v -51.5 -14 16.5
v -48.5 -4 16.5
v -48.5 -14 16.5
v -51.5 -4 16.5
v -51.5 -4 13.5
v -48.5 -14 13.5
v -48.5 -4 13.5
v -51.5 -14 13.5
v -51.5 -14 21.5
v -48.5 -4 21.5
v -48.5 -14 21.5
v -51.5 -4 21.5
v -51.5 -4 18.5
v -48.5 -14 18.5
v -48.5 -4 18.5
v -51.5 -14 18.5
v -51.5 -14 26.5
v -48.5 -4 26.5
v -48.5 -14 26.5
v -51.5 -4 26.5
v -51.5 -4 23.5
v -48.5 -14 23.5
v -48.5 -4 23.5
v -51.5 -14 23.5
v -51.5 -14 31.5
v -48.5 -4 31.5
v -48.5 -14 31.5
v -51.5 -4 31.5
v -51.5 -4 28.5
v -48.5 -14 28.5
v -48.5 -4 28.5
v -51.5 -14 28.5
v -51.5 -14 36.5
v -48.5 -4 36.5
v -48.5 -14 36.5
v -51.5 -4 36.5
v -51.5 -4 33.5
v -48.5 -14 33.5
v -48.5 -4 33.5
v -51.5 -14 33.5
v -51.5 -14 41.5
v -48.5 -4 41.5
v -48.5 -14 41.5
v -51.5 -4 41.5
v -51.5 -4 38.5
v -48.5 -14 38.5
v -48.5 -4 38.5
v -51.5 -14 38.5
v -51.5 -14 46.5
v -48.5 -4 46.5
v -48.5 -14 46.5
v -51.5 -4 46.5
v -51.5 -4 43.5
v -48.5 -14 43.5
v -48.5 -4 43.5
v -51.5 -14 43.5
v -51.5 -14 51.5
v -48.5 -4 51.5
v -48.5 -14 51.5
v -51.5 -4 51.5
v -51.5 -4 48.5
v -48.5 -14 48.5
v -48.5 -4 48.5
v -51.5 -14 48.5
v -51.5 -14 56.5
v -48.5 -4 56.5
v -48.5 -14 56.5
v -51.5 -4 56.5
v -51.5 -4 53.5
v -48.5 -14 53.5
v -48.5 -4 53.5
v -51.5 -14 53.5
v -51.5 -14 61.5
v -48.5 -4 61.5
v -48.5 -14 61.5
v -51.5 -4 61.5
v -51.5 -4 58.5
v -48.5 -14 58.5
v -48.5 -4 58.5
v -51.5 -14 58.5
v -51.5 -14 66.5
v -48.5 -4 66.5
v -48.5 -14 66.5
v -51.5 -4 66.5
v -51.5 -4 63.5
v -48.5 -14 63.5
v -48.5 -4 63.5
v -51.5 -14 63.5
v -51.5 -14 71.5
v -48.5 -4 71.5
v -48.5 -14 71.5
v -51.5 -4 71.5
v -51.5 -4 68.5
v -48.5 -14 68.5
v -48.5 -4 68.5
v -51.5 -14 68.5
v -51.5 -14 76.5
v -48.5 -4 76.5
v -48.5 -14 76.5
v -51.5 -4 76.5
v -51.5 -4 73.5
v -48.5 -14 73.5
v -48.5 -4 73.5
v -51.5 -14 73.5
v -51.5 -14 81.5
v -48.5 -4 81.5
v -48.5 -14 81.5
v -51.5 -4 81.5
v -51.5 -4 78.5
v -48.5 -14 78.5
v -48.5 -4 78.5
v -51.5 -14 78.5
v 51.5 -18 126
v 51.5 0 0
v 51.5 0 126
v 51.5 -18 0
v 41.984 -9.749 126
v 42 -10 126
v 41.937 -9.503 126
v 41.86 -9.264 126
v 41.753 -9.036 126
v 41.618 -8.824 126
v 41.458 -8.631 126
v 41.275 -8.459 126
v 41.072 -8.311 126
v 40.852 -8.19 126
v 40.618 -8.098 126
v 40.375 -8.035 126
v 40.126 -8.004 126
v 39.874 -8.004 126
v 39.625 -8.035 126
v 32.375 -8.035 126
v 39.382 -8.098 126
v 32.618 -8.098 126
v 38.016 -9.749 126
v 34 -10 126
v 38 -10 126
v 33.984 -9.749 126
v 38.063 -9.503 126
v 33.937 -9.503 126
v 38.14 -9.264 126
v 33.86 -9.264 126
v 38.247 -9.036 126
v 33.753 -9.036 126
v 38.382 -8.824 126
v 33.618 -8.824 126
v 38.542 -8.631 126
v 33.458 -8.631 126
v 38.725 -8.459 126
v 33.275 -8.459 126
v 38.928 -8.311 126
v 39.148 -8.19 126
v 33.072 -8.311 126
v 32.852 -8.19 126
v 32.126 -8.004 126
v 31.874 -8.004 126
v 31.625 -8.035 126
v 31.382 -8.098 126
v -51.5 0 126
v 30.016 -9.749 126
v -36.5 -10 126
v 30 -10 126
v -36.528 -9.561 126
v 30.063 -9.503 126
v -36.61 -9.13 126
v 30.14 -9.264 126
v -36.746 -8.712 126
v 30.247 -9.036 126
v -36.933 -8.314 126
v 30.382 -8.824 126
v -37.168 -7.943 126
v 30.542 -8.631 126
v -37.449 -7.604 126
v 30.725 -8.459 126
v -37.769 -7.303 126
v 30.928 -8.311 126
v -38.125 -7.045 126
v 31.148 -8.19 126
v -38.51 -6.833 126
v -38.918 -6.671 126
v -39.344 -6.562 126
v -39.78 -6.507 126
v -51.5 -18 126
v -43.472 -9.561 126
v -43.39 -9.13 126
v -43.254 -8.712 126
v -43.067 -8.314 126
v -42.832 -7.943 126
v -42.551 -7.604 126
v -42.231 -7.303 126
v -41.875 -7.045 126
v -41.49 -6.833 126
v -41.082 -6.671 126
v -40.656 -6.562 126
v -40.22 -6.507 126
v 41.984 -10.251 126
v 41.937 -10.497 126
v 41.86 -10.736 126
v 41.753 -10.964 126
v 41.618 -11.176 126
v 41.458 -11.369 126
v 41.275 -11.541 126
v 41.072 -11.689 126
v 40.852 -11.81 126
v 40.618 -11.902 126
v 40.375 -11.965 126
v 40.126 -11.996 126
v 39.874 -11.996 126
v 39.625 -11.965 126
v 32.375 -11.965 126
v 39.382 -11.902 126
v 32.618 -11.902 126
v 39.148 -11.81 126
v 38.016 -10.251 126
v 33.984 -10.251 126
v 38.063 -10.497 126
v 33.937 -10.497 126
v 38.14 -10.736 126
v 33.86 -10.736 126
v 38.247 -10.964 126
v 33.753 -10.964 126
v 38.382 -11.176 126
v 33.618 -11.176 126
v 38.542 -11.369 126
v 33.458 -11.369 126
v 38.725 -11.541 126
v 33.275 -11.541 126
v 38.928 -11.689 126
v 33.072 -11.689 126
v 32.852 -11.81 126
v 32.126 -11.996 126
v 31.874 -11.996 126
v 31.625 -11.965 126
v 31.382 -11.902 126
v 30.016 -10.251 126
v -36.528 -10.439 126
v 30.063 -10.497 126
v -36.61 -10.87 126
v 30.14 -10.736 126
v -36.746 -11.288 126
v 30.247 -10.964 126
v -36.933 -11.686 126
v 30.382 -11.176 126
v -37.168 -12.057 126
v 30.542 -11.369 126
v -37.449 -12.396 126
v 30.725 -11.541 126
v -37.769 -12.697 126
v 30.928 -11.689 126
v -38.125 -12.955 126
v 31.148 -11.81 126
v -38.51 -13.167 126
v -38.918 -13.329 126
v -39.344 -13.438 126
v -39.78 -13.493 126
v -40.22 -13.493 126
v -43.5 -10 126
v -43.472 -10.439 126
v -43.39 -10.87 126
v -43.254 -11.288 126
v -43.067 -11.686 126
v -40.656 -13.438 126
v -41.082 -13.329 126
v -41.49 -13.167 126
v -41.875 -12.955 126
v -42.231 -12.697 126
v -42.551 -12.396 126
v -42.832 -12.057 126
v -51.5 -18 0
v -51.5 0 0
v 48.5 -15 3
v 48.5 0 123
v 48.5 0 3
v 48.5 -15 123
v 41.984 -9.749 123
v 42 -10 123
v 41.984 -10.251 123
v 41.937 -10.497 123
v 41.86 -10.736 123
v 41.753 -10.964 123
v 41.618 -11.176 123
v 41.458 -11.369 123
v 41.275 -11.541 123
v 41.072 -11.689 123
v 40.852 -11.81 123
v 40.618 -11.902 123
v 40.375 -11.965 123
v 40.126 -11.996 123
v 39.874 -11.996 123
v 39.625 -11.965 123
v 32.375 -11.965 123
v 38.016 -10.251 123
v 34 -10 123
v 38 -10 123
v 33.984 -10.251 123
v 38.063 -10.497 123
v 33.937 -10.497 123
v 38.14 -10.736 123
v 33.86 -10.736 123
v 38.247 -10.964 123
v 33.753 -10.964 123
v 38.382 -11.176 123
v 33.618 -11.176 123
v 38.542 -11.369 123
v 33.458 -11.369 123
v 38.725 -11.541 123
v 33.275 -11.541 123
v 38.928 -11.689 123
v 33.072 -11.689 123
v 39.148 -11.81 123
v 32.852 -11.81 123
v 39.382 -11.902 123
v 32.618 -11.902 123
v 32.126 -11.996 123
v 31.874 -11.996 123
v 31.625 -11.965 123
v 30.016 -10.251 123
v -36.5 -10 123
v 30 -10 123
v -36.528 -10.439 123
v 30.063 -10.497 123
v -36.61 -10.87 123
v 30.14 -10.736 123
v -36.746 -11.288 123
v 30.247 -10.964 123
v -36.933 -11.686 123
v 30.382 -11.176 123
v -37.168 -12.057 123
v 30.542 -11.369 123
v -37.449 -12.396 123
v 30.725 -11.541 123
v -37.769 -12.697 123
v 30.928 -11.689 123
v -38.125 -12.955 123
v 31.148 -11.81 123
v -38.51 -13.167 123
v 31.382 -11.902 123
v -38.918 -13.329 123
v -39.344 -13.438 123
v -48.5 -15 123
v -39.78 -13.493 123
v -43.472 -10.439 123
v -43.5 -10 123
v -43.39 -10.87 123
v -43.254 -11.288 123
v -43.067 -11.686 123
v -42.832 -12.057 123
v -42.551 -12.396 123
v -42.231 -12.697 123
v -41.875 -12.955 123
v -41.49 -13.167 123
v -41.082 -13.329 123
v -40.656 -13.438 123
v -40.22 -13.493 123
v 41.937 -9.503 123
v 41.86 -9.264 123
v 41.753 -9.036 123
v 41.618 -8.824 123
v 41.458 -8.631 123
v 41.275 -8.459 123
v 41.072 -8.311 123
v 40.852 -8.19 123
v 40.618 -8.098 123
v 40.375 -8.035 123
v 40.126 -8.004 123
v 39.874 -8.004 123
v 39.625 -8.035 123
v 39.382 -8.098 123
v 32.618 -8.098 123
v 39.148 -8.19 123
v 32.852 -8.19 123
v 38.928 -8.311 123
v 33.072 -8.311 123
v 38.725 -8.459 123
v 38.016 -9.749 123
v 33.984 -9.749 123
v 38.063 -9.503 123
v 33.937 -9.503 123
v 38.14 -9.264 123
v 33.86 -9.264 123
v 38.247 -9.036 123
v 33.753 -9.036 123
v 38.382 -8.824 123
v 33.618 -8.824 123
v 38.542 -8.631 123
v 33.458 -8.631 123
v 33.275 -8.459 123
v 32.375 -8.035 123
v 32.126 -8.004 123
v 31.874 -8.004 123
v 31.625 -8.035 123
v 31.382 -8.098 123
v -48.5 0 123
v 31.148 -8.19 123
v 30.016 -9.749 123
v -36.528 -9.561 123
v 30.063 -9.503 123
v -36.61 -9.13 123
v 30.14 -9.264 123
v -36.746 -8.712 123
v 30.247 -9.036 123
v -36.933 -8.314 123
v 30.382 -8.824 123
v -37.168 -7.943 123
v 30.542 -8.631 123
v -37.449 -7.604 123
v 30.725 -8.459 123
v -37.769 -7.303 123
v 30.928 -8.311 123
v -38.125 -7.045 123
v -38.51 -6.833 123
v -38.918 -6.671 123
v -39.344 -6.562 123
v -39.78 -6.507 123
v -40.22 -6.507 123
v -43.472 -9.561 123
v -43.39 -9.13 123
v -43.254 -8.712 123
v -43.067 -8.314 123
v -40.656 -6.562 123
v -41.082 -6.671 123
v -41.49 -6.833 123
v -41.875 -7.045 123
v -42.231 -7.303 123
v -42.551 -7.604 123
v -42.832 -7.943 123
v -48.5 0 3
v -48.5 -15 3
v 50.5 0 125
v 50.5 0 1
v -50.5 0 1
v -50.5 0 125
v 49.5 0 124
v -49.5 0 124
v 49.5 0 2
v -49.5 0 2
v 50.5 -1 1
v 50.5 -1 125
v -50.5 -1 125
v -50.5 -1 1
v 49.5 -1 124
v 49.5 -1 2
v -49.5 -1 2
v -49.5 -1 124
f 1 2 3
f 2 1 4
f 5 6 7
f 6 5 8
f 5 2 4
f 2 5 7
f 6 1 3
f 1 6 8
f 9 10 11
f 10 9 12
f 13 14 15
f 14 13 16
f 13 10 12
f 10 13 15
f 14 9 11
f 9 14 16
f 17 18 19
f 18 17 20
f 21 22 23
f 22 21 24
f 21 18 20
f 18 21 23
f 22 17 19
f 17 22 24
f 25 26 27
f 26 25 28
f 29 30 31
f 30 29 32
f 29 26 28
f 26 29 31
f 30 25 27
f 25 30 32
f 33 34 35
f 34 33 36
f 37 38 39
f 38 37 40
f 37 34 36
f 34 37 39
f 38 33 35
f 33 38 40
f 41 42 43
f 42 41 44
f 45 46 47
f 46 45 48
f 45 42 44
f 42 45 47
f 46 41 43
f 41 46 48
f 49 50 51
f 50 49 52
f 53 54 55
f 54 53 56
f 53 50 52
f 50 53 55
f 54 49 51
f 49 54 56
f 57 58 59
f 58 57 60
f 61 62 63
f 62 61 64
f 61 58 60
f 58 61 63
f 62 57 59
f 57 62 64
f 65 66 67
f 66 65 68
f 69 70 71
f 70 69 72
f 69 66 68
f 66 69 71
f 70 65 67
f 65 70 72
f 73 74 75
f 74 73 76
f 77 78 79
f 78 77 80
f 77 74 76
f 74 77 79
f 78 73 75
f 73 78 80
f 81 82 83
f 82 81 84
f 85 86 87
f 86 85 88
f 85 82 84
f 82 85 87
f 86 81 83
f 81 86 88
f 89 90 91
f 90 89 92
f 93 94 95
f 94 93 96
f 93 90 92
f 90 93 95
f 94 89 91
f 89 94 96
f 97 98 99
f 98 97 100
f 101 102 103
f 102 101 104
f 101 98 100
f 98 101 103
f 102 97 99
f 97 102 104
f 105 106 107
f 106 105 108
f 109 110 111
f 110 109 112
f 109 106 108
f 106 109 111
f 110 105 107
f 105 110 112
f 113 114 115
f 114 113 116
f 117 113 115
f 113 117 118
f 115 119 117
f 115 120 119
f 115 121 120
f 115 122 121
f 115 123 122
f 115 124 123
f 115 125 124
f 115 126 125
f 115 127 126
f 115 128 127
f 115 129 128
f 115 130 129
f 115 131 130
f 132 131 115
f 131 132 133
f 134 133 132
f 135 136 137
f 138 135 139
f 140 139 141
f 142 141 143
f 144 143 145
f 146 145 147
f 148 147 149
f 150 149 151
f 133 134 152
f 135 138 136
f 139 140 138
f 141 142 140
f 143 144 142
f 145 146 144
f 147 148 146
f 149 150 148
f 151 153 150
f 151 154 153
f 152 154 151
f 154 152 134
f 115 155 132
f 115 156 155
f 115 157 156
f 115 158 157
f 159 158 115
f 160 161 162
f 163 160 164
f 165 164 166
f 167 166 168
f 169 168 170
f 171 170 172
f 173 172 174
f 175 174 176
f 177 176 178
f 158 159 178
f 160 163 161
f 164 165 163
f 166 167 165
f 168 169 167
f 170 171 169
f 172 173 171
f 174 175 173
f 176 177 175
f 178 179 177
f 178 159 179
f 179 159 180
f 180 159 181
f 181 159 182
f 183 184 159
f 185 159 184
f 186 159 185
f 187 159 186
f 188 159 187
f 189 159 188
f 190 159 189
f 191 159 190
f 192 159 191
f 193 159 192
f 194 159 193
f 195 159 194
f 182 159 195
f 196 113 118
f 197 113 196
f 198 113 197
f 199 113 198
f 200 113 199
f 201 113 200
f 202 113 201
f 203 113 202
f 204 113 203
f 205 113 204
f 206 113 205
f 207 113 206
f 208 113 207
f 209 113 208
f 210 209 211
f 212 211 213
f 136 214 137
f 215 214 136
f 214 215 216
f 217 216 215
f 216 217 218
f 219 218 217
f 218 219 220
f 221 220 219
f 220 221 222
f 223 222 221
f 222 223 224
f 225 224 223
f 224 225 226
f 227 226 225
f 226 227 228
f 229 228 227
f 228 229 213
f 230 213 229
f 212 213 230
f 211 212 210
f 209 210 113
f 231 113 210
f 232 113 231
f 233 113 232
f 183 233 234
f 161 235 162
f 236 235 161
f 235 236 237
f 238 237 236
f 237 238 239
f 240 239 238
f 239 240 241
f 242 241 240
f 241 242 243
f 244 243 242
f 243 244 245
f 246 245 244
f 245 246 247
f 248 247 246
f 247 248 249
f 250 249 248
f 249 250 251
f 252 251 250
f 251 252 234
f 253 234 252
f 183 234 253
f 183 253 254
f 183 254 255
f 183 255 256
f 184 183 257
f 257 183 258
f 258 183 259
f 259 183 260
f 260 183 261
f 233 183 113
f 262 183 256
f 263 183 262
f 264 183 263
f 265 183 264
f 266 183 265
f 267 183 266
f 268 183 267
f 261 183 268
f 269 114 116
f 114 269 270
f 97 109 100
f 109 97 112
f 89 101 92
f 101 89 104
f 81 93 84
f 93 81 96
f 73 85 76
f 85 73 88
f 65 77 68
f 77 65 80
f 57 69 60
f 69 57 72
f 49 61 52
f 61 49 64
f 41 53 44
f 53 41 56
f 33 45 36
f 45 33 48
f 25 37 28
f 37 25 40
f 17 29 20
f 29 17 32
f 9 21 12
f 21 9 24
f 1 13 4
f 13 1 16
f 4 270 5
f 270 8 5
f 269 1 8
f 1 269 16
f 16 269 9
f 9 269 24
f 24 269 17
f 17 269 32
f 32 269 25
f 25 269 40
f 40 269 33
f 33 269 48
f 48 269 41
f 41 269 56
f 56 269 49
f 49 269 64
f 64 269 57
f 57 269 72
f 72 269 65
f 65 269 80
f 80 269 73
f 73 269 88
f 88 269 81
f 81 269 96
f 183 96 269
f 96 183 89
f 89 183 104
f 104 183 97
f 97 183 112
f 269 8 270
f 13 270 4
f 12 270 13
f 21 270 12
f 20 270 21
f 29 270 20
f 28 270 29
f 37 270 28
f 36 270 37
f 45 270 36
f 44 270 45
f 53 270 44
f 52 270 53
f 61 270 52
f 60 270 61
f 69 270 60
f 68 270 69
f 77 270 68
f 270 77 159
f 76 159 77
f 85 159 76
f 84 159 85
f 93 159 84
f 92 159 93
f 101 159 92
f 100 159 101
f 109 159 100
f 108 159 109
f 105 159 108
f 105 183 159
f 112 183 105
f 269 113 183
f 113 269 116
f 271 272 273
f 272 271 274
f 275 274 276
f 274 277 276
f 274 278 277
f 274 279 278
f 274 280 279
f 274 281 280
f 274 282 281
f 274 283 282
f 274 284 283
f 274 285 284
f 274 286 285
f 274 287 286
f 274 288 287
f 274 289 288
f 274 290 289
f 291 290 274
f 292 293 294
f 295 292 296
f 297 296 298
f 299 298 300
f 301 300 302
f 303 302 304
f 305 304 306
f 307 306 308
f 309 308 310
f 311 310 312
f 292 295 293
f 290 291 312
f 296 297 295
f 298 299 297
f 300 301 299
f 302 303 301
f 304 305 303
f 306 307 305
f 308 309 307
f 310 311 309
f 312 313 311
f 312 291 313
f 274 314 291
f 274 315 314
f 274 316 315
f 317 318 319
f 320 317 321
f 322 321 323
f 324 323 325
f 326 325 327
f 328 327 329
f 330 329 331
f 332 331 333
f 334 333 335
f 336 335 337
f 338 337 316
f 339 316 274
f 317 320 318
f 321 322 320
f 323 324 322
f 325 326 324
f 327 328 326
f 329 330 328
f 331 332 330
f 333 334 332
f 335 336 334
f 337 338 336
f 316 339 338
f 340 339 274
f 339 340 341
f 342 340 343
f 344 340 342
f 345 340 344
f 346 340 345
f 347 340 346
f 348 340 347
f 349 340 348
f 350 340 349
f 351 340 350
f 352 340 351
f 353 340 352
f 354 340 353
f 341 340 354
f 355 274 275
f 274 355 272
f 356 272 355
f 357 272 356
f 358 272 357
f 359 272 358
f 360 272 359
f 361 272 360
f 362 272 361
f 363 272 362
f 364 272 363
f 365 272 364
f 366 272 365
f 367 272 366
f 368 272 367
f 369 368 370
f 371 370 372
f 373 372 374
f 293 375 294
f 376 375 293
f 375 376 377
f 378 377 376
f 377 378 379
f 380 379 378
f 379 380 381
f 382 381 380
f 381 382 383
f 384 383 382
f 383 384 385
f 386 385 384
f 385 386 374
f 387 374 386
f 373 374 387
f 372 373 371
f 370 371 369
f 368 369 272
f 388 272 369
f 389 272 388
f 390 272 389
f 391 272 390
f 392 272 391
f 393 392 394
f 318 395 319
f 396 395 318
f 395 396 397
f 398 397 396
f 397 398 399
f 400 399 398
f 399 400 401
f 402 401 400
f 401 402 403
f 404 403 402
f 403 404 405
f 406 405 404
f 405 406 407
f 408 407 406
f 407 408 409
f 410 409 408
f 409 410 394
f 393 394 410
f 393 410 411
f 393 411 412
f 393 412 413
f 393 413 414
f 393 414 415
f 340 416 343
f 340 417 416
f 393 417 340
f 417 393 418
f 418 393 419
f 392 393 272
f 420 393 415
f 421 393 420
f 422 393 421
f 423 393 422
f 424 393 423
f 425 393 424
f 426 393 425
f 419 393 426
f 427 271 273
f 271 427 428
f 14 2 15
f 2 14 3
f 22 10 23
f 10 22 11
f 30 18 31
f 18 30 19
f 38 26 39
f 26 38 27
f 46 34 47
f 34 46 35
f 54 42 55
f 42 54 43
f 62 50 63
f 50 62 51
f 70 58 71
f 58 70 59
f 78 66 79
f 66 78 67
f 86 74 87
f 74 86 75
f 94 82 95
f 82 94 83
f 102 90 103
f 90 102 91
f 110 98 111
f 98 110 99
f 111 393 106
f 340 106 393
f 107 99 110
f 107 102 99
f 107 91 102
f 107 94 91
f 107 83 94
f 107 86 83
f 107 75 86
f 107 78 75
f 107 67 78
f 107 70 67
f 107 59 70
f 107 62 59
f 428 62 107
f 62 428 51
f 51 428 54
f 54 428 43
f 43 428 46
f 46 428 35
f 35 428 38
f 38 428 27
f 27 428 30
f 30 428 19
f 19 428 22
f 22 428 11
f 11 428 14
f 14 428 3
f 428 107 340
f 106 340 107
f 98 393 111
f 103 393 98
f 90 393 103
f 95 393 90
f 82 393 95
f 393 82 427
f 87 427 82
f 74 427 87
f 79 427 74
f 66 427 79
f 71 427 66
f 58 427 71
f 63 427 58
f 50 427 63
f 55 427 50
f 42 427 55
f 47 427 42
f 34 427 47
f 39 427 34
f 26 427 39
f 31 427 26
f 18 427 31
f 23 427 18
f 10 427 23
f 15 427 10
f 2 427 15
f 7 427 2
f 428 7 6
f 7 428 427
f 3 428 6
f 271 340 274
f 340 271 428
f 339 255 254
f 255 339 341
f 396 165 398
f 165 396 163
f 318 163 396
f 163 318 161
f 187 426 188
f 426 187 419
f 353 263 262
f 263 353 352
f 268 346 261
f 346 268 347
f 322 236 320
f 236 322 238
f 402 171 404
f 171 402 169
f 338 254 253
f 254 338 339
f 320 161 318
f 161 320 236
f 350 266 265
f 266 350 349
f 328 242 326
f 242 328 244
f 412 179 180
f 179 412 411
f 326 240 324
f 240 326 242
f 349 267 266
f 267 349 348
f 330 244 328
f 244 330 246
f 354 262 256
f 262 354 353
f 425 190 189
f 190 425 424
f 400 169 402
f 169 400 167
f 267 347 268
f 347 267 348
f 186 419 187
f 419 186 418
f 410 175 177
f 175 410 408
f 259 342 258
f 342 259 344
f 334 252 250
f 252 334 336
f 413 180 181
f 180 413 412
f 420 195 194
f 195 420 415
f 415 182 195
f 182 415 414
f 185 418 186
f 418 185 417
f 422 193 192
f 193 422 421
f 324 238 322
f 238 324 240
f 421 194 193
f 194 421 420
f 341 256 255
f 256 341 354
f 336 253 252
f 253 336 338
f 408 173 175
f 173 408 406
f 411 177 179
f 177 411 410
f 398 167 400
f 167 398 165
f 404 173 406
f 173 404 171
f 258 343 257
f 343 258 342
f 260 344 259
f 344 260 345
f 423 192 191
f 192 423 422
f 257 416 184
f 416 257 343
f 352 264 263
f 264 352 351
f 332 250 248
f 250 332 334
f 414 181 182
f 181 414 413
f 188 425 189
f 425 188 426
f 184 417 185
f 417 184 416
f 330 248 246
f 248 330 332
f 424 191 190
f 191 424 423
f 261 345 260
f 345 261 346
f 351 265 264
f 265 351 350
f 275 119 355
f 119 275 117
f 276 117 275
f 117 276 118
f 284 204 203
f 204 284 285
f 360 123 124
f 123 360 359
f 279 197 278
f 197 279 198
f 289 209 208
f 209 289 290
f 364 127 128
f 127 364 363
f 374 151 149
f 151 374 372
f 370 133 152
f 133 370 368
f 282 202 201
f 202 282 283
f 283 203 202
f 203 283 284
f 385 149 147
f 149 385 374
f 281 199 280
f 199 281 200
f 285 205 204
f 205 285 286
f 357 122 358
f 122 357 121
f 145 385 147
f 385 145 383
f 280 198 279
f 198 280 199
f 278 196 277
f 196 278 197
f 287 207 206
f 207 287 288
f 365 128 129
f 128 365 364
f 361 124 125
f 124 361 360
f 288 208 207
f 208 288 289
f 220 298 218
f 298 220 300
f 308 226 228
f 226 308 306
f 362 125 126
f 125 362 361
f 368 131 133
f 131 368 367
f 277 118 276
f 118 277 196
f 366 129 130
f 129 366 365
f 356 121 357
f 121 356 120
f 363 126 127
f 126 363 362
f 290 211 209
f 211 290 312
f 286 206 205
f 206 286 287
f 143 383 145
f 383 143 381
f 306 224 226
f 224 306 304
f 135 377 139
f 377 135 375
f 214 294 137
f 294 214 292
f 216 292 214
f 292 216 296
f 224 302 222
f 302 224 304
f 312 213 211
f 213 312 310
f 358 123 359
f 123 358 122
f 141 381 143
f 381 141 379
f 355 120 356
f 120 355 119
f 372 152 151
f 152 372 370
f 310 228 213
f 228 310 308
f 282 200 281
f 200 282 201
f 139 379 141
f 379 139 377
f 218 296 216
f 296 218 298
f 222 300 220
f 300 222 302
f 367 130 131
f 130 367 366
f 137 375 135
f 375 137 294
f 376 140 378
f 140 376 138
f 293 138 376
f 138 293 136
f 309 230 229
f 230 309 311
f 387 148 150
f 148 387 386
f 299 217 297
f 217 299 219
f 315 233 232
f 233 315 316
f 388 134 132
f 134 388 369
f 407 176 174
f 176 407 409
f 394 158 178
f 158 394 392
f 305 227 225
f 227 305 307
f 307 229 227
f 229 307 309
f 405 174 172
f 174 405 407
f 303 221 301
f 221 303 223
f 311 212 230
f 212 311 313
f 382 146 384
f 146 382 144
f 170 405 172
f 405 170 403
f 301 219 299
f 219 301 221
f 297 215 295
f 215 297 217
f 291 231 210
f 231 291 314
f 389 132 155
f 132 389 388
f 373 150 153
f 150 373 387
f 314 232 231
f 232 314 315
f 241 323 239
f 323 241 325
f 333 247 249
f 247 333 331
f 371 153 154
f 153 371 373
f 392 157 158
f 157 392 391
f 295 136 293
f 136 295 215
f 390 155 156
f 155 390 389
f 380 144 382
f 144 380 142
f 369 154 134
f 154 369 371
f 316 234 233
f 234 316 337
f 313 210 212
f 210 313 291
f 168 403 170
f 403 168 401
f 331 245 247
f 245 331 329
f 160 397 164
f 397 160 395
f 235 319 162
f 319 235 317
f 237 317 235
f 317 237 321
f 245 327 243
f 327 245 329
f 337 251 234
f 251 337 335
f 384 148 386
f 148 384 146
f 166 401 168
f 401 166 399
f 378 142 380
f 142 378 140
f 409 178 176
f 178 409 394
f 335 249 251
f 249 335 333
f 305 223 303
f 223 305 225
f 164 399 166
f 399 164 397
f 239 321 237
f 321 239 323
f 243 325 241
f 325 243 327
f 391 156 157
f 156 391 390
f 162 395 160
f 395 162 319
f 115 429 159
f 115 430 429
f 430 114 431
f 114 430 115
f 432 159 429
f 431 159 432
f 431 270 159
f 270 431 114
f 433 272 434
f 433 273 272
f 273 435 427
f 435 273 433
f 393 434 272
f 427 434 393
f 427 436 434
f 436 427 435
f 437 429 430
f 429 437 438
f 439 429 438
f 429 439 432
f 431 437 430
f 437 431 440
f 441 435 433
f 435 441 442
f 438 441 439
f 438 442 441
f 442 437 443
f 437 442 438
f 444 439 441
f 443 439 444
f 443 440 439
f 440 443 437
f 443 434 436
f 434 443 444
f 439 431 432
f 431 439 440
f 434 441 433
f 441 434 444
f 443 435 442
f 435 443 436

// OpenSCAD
// meanwell LRS psu cover
// **************************

width      = 97;
height = 30;
depth = 120;
thick = 3;
$fn=50;


difference () {
  translate ([0,0,(depth+thick*2)/2]) cube([width+thick*2,height+thick*2,depth+thick*2], center=true);
  translate ([0,0,depth/2+thick]) cube([width,height,depth], center=true);

 
  for (i=[15:5:80] ){
      translate ([0,height/2-5,i]) cube([20,20,3], center=true);
      translate ([25,height/2-5,i]) cube([20,20,3], center=true);
      translate ([-25,height/2-5,i]) cube([20,20,3], center=true);
      translate ([-width/2,-height/2+6,i]) cube([20,10,3], center=true);
  }
   
  translate ([-40,-10,depth]) cylinder(h=20, r=3.5);
  translate ([40,-10,depth]) cylinder(h=20, r=2);
  translate ([32,-10,depth]) cylinder(h=20, r=2);
  
   /*
   translate ([-(side+sidethick*2),-sidethick-side,0]) cube([side+sidethick,side*2+sidethick*2,overlap+endthick+5]);

   translate ([-(side+sidethick),-sidethick*2-side,0]) cube([side*2+sidethick*2,side+sidethick,overlap+endthick+5]);

   translate ([-side,-sidethick,overlap+endthick-3]) rotate([45,0,0]) cube([side*3,10,10]);

   translate ([-sidethick,-sidethick,overlap+endthick-3]) rotate([45,0,90]) cube([side*3,10,10]);
*/

    //half cut off
  //top
   translate ([0,height/2,(depth+10)/2]) cube([width+10,height,depth+10], center=true);
  
   translate ([width/2+1.5,0,depth/2+3]) cube([1,2,depth+4], center=true);
   translate ([-(width/2+1.5),0,depth/2+3]) cube([1,2,depth+4], center=true);
   translate ([0,0,depth+4.5]) cube([width+3,2,1], center=true);
   translate ([0,0,1.5]) cube([width+3,2,1], center=true);
  
  //bottom
    //translate ([0,-height/2,(depth+10)/2]) cube([width+10,height,depth+10], center=true);

}
   
   //bottom rim
   /*translate ([width/2+1.5,0,depth/2+3]) cube([1,2,depth+4], center=true);
   translate ([-(width/2+1.5),0,depth/2+3]) cube([1,2,depth+4], center=true);
   translate ([0,0,depth+4.5]) cube([width+3,2,1], center=true);
   translate ([0,0,1.5]) cube([width+3,2,1], center=true);*/

   
